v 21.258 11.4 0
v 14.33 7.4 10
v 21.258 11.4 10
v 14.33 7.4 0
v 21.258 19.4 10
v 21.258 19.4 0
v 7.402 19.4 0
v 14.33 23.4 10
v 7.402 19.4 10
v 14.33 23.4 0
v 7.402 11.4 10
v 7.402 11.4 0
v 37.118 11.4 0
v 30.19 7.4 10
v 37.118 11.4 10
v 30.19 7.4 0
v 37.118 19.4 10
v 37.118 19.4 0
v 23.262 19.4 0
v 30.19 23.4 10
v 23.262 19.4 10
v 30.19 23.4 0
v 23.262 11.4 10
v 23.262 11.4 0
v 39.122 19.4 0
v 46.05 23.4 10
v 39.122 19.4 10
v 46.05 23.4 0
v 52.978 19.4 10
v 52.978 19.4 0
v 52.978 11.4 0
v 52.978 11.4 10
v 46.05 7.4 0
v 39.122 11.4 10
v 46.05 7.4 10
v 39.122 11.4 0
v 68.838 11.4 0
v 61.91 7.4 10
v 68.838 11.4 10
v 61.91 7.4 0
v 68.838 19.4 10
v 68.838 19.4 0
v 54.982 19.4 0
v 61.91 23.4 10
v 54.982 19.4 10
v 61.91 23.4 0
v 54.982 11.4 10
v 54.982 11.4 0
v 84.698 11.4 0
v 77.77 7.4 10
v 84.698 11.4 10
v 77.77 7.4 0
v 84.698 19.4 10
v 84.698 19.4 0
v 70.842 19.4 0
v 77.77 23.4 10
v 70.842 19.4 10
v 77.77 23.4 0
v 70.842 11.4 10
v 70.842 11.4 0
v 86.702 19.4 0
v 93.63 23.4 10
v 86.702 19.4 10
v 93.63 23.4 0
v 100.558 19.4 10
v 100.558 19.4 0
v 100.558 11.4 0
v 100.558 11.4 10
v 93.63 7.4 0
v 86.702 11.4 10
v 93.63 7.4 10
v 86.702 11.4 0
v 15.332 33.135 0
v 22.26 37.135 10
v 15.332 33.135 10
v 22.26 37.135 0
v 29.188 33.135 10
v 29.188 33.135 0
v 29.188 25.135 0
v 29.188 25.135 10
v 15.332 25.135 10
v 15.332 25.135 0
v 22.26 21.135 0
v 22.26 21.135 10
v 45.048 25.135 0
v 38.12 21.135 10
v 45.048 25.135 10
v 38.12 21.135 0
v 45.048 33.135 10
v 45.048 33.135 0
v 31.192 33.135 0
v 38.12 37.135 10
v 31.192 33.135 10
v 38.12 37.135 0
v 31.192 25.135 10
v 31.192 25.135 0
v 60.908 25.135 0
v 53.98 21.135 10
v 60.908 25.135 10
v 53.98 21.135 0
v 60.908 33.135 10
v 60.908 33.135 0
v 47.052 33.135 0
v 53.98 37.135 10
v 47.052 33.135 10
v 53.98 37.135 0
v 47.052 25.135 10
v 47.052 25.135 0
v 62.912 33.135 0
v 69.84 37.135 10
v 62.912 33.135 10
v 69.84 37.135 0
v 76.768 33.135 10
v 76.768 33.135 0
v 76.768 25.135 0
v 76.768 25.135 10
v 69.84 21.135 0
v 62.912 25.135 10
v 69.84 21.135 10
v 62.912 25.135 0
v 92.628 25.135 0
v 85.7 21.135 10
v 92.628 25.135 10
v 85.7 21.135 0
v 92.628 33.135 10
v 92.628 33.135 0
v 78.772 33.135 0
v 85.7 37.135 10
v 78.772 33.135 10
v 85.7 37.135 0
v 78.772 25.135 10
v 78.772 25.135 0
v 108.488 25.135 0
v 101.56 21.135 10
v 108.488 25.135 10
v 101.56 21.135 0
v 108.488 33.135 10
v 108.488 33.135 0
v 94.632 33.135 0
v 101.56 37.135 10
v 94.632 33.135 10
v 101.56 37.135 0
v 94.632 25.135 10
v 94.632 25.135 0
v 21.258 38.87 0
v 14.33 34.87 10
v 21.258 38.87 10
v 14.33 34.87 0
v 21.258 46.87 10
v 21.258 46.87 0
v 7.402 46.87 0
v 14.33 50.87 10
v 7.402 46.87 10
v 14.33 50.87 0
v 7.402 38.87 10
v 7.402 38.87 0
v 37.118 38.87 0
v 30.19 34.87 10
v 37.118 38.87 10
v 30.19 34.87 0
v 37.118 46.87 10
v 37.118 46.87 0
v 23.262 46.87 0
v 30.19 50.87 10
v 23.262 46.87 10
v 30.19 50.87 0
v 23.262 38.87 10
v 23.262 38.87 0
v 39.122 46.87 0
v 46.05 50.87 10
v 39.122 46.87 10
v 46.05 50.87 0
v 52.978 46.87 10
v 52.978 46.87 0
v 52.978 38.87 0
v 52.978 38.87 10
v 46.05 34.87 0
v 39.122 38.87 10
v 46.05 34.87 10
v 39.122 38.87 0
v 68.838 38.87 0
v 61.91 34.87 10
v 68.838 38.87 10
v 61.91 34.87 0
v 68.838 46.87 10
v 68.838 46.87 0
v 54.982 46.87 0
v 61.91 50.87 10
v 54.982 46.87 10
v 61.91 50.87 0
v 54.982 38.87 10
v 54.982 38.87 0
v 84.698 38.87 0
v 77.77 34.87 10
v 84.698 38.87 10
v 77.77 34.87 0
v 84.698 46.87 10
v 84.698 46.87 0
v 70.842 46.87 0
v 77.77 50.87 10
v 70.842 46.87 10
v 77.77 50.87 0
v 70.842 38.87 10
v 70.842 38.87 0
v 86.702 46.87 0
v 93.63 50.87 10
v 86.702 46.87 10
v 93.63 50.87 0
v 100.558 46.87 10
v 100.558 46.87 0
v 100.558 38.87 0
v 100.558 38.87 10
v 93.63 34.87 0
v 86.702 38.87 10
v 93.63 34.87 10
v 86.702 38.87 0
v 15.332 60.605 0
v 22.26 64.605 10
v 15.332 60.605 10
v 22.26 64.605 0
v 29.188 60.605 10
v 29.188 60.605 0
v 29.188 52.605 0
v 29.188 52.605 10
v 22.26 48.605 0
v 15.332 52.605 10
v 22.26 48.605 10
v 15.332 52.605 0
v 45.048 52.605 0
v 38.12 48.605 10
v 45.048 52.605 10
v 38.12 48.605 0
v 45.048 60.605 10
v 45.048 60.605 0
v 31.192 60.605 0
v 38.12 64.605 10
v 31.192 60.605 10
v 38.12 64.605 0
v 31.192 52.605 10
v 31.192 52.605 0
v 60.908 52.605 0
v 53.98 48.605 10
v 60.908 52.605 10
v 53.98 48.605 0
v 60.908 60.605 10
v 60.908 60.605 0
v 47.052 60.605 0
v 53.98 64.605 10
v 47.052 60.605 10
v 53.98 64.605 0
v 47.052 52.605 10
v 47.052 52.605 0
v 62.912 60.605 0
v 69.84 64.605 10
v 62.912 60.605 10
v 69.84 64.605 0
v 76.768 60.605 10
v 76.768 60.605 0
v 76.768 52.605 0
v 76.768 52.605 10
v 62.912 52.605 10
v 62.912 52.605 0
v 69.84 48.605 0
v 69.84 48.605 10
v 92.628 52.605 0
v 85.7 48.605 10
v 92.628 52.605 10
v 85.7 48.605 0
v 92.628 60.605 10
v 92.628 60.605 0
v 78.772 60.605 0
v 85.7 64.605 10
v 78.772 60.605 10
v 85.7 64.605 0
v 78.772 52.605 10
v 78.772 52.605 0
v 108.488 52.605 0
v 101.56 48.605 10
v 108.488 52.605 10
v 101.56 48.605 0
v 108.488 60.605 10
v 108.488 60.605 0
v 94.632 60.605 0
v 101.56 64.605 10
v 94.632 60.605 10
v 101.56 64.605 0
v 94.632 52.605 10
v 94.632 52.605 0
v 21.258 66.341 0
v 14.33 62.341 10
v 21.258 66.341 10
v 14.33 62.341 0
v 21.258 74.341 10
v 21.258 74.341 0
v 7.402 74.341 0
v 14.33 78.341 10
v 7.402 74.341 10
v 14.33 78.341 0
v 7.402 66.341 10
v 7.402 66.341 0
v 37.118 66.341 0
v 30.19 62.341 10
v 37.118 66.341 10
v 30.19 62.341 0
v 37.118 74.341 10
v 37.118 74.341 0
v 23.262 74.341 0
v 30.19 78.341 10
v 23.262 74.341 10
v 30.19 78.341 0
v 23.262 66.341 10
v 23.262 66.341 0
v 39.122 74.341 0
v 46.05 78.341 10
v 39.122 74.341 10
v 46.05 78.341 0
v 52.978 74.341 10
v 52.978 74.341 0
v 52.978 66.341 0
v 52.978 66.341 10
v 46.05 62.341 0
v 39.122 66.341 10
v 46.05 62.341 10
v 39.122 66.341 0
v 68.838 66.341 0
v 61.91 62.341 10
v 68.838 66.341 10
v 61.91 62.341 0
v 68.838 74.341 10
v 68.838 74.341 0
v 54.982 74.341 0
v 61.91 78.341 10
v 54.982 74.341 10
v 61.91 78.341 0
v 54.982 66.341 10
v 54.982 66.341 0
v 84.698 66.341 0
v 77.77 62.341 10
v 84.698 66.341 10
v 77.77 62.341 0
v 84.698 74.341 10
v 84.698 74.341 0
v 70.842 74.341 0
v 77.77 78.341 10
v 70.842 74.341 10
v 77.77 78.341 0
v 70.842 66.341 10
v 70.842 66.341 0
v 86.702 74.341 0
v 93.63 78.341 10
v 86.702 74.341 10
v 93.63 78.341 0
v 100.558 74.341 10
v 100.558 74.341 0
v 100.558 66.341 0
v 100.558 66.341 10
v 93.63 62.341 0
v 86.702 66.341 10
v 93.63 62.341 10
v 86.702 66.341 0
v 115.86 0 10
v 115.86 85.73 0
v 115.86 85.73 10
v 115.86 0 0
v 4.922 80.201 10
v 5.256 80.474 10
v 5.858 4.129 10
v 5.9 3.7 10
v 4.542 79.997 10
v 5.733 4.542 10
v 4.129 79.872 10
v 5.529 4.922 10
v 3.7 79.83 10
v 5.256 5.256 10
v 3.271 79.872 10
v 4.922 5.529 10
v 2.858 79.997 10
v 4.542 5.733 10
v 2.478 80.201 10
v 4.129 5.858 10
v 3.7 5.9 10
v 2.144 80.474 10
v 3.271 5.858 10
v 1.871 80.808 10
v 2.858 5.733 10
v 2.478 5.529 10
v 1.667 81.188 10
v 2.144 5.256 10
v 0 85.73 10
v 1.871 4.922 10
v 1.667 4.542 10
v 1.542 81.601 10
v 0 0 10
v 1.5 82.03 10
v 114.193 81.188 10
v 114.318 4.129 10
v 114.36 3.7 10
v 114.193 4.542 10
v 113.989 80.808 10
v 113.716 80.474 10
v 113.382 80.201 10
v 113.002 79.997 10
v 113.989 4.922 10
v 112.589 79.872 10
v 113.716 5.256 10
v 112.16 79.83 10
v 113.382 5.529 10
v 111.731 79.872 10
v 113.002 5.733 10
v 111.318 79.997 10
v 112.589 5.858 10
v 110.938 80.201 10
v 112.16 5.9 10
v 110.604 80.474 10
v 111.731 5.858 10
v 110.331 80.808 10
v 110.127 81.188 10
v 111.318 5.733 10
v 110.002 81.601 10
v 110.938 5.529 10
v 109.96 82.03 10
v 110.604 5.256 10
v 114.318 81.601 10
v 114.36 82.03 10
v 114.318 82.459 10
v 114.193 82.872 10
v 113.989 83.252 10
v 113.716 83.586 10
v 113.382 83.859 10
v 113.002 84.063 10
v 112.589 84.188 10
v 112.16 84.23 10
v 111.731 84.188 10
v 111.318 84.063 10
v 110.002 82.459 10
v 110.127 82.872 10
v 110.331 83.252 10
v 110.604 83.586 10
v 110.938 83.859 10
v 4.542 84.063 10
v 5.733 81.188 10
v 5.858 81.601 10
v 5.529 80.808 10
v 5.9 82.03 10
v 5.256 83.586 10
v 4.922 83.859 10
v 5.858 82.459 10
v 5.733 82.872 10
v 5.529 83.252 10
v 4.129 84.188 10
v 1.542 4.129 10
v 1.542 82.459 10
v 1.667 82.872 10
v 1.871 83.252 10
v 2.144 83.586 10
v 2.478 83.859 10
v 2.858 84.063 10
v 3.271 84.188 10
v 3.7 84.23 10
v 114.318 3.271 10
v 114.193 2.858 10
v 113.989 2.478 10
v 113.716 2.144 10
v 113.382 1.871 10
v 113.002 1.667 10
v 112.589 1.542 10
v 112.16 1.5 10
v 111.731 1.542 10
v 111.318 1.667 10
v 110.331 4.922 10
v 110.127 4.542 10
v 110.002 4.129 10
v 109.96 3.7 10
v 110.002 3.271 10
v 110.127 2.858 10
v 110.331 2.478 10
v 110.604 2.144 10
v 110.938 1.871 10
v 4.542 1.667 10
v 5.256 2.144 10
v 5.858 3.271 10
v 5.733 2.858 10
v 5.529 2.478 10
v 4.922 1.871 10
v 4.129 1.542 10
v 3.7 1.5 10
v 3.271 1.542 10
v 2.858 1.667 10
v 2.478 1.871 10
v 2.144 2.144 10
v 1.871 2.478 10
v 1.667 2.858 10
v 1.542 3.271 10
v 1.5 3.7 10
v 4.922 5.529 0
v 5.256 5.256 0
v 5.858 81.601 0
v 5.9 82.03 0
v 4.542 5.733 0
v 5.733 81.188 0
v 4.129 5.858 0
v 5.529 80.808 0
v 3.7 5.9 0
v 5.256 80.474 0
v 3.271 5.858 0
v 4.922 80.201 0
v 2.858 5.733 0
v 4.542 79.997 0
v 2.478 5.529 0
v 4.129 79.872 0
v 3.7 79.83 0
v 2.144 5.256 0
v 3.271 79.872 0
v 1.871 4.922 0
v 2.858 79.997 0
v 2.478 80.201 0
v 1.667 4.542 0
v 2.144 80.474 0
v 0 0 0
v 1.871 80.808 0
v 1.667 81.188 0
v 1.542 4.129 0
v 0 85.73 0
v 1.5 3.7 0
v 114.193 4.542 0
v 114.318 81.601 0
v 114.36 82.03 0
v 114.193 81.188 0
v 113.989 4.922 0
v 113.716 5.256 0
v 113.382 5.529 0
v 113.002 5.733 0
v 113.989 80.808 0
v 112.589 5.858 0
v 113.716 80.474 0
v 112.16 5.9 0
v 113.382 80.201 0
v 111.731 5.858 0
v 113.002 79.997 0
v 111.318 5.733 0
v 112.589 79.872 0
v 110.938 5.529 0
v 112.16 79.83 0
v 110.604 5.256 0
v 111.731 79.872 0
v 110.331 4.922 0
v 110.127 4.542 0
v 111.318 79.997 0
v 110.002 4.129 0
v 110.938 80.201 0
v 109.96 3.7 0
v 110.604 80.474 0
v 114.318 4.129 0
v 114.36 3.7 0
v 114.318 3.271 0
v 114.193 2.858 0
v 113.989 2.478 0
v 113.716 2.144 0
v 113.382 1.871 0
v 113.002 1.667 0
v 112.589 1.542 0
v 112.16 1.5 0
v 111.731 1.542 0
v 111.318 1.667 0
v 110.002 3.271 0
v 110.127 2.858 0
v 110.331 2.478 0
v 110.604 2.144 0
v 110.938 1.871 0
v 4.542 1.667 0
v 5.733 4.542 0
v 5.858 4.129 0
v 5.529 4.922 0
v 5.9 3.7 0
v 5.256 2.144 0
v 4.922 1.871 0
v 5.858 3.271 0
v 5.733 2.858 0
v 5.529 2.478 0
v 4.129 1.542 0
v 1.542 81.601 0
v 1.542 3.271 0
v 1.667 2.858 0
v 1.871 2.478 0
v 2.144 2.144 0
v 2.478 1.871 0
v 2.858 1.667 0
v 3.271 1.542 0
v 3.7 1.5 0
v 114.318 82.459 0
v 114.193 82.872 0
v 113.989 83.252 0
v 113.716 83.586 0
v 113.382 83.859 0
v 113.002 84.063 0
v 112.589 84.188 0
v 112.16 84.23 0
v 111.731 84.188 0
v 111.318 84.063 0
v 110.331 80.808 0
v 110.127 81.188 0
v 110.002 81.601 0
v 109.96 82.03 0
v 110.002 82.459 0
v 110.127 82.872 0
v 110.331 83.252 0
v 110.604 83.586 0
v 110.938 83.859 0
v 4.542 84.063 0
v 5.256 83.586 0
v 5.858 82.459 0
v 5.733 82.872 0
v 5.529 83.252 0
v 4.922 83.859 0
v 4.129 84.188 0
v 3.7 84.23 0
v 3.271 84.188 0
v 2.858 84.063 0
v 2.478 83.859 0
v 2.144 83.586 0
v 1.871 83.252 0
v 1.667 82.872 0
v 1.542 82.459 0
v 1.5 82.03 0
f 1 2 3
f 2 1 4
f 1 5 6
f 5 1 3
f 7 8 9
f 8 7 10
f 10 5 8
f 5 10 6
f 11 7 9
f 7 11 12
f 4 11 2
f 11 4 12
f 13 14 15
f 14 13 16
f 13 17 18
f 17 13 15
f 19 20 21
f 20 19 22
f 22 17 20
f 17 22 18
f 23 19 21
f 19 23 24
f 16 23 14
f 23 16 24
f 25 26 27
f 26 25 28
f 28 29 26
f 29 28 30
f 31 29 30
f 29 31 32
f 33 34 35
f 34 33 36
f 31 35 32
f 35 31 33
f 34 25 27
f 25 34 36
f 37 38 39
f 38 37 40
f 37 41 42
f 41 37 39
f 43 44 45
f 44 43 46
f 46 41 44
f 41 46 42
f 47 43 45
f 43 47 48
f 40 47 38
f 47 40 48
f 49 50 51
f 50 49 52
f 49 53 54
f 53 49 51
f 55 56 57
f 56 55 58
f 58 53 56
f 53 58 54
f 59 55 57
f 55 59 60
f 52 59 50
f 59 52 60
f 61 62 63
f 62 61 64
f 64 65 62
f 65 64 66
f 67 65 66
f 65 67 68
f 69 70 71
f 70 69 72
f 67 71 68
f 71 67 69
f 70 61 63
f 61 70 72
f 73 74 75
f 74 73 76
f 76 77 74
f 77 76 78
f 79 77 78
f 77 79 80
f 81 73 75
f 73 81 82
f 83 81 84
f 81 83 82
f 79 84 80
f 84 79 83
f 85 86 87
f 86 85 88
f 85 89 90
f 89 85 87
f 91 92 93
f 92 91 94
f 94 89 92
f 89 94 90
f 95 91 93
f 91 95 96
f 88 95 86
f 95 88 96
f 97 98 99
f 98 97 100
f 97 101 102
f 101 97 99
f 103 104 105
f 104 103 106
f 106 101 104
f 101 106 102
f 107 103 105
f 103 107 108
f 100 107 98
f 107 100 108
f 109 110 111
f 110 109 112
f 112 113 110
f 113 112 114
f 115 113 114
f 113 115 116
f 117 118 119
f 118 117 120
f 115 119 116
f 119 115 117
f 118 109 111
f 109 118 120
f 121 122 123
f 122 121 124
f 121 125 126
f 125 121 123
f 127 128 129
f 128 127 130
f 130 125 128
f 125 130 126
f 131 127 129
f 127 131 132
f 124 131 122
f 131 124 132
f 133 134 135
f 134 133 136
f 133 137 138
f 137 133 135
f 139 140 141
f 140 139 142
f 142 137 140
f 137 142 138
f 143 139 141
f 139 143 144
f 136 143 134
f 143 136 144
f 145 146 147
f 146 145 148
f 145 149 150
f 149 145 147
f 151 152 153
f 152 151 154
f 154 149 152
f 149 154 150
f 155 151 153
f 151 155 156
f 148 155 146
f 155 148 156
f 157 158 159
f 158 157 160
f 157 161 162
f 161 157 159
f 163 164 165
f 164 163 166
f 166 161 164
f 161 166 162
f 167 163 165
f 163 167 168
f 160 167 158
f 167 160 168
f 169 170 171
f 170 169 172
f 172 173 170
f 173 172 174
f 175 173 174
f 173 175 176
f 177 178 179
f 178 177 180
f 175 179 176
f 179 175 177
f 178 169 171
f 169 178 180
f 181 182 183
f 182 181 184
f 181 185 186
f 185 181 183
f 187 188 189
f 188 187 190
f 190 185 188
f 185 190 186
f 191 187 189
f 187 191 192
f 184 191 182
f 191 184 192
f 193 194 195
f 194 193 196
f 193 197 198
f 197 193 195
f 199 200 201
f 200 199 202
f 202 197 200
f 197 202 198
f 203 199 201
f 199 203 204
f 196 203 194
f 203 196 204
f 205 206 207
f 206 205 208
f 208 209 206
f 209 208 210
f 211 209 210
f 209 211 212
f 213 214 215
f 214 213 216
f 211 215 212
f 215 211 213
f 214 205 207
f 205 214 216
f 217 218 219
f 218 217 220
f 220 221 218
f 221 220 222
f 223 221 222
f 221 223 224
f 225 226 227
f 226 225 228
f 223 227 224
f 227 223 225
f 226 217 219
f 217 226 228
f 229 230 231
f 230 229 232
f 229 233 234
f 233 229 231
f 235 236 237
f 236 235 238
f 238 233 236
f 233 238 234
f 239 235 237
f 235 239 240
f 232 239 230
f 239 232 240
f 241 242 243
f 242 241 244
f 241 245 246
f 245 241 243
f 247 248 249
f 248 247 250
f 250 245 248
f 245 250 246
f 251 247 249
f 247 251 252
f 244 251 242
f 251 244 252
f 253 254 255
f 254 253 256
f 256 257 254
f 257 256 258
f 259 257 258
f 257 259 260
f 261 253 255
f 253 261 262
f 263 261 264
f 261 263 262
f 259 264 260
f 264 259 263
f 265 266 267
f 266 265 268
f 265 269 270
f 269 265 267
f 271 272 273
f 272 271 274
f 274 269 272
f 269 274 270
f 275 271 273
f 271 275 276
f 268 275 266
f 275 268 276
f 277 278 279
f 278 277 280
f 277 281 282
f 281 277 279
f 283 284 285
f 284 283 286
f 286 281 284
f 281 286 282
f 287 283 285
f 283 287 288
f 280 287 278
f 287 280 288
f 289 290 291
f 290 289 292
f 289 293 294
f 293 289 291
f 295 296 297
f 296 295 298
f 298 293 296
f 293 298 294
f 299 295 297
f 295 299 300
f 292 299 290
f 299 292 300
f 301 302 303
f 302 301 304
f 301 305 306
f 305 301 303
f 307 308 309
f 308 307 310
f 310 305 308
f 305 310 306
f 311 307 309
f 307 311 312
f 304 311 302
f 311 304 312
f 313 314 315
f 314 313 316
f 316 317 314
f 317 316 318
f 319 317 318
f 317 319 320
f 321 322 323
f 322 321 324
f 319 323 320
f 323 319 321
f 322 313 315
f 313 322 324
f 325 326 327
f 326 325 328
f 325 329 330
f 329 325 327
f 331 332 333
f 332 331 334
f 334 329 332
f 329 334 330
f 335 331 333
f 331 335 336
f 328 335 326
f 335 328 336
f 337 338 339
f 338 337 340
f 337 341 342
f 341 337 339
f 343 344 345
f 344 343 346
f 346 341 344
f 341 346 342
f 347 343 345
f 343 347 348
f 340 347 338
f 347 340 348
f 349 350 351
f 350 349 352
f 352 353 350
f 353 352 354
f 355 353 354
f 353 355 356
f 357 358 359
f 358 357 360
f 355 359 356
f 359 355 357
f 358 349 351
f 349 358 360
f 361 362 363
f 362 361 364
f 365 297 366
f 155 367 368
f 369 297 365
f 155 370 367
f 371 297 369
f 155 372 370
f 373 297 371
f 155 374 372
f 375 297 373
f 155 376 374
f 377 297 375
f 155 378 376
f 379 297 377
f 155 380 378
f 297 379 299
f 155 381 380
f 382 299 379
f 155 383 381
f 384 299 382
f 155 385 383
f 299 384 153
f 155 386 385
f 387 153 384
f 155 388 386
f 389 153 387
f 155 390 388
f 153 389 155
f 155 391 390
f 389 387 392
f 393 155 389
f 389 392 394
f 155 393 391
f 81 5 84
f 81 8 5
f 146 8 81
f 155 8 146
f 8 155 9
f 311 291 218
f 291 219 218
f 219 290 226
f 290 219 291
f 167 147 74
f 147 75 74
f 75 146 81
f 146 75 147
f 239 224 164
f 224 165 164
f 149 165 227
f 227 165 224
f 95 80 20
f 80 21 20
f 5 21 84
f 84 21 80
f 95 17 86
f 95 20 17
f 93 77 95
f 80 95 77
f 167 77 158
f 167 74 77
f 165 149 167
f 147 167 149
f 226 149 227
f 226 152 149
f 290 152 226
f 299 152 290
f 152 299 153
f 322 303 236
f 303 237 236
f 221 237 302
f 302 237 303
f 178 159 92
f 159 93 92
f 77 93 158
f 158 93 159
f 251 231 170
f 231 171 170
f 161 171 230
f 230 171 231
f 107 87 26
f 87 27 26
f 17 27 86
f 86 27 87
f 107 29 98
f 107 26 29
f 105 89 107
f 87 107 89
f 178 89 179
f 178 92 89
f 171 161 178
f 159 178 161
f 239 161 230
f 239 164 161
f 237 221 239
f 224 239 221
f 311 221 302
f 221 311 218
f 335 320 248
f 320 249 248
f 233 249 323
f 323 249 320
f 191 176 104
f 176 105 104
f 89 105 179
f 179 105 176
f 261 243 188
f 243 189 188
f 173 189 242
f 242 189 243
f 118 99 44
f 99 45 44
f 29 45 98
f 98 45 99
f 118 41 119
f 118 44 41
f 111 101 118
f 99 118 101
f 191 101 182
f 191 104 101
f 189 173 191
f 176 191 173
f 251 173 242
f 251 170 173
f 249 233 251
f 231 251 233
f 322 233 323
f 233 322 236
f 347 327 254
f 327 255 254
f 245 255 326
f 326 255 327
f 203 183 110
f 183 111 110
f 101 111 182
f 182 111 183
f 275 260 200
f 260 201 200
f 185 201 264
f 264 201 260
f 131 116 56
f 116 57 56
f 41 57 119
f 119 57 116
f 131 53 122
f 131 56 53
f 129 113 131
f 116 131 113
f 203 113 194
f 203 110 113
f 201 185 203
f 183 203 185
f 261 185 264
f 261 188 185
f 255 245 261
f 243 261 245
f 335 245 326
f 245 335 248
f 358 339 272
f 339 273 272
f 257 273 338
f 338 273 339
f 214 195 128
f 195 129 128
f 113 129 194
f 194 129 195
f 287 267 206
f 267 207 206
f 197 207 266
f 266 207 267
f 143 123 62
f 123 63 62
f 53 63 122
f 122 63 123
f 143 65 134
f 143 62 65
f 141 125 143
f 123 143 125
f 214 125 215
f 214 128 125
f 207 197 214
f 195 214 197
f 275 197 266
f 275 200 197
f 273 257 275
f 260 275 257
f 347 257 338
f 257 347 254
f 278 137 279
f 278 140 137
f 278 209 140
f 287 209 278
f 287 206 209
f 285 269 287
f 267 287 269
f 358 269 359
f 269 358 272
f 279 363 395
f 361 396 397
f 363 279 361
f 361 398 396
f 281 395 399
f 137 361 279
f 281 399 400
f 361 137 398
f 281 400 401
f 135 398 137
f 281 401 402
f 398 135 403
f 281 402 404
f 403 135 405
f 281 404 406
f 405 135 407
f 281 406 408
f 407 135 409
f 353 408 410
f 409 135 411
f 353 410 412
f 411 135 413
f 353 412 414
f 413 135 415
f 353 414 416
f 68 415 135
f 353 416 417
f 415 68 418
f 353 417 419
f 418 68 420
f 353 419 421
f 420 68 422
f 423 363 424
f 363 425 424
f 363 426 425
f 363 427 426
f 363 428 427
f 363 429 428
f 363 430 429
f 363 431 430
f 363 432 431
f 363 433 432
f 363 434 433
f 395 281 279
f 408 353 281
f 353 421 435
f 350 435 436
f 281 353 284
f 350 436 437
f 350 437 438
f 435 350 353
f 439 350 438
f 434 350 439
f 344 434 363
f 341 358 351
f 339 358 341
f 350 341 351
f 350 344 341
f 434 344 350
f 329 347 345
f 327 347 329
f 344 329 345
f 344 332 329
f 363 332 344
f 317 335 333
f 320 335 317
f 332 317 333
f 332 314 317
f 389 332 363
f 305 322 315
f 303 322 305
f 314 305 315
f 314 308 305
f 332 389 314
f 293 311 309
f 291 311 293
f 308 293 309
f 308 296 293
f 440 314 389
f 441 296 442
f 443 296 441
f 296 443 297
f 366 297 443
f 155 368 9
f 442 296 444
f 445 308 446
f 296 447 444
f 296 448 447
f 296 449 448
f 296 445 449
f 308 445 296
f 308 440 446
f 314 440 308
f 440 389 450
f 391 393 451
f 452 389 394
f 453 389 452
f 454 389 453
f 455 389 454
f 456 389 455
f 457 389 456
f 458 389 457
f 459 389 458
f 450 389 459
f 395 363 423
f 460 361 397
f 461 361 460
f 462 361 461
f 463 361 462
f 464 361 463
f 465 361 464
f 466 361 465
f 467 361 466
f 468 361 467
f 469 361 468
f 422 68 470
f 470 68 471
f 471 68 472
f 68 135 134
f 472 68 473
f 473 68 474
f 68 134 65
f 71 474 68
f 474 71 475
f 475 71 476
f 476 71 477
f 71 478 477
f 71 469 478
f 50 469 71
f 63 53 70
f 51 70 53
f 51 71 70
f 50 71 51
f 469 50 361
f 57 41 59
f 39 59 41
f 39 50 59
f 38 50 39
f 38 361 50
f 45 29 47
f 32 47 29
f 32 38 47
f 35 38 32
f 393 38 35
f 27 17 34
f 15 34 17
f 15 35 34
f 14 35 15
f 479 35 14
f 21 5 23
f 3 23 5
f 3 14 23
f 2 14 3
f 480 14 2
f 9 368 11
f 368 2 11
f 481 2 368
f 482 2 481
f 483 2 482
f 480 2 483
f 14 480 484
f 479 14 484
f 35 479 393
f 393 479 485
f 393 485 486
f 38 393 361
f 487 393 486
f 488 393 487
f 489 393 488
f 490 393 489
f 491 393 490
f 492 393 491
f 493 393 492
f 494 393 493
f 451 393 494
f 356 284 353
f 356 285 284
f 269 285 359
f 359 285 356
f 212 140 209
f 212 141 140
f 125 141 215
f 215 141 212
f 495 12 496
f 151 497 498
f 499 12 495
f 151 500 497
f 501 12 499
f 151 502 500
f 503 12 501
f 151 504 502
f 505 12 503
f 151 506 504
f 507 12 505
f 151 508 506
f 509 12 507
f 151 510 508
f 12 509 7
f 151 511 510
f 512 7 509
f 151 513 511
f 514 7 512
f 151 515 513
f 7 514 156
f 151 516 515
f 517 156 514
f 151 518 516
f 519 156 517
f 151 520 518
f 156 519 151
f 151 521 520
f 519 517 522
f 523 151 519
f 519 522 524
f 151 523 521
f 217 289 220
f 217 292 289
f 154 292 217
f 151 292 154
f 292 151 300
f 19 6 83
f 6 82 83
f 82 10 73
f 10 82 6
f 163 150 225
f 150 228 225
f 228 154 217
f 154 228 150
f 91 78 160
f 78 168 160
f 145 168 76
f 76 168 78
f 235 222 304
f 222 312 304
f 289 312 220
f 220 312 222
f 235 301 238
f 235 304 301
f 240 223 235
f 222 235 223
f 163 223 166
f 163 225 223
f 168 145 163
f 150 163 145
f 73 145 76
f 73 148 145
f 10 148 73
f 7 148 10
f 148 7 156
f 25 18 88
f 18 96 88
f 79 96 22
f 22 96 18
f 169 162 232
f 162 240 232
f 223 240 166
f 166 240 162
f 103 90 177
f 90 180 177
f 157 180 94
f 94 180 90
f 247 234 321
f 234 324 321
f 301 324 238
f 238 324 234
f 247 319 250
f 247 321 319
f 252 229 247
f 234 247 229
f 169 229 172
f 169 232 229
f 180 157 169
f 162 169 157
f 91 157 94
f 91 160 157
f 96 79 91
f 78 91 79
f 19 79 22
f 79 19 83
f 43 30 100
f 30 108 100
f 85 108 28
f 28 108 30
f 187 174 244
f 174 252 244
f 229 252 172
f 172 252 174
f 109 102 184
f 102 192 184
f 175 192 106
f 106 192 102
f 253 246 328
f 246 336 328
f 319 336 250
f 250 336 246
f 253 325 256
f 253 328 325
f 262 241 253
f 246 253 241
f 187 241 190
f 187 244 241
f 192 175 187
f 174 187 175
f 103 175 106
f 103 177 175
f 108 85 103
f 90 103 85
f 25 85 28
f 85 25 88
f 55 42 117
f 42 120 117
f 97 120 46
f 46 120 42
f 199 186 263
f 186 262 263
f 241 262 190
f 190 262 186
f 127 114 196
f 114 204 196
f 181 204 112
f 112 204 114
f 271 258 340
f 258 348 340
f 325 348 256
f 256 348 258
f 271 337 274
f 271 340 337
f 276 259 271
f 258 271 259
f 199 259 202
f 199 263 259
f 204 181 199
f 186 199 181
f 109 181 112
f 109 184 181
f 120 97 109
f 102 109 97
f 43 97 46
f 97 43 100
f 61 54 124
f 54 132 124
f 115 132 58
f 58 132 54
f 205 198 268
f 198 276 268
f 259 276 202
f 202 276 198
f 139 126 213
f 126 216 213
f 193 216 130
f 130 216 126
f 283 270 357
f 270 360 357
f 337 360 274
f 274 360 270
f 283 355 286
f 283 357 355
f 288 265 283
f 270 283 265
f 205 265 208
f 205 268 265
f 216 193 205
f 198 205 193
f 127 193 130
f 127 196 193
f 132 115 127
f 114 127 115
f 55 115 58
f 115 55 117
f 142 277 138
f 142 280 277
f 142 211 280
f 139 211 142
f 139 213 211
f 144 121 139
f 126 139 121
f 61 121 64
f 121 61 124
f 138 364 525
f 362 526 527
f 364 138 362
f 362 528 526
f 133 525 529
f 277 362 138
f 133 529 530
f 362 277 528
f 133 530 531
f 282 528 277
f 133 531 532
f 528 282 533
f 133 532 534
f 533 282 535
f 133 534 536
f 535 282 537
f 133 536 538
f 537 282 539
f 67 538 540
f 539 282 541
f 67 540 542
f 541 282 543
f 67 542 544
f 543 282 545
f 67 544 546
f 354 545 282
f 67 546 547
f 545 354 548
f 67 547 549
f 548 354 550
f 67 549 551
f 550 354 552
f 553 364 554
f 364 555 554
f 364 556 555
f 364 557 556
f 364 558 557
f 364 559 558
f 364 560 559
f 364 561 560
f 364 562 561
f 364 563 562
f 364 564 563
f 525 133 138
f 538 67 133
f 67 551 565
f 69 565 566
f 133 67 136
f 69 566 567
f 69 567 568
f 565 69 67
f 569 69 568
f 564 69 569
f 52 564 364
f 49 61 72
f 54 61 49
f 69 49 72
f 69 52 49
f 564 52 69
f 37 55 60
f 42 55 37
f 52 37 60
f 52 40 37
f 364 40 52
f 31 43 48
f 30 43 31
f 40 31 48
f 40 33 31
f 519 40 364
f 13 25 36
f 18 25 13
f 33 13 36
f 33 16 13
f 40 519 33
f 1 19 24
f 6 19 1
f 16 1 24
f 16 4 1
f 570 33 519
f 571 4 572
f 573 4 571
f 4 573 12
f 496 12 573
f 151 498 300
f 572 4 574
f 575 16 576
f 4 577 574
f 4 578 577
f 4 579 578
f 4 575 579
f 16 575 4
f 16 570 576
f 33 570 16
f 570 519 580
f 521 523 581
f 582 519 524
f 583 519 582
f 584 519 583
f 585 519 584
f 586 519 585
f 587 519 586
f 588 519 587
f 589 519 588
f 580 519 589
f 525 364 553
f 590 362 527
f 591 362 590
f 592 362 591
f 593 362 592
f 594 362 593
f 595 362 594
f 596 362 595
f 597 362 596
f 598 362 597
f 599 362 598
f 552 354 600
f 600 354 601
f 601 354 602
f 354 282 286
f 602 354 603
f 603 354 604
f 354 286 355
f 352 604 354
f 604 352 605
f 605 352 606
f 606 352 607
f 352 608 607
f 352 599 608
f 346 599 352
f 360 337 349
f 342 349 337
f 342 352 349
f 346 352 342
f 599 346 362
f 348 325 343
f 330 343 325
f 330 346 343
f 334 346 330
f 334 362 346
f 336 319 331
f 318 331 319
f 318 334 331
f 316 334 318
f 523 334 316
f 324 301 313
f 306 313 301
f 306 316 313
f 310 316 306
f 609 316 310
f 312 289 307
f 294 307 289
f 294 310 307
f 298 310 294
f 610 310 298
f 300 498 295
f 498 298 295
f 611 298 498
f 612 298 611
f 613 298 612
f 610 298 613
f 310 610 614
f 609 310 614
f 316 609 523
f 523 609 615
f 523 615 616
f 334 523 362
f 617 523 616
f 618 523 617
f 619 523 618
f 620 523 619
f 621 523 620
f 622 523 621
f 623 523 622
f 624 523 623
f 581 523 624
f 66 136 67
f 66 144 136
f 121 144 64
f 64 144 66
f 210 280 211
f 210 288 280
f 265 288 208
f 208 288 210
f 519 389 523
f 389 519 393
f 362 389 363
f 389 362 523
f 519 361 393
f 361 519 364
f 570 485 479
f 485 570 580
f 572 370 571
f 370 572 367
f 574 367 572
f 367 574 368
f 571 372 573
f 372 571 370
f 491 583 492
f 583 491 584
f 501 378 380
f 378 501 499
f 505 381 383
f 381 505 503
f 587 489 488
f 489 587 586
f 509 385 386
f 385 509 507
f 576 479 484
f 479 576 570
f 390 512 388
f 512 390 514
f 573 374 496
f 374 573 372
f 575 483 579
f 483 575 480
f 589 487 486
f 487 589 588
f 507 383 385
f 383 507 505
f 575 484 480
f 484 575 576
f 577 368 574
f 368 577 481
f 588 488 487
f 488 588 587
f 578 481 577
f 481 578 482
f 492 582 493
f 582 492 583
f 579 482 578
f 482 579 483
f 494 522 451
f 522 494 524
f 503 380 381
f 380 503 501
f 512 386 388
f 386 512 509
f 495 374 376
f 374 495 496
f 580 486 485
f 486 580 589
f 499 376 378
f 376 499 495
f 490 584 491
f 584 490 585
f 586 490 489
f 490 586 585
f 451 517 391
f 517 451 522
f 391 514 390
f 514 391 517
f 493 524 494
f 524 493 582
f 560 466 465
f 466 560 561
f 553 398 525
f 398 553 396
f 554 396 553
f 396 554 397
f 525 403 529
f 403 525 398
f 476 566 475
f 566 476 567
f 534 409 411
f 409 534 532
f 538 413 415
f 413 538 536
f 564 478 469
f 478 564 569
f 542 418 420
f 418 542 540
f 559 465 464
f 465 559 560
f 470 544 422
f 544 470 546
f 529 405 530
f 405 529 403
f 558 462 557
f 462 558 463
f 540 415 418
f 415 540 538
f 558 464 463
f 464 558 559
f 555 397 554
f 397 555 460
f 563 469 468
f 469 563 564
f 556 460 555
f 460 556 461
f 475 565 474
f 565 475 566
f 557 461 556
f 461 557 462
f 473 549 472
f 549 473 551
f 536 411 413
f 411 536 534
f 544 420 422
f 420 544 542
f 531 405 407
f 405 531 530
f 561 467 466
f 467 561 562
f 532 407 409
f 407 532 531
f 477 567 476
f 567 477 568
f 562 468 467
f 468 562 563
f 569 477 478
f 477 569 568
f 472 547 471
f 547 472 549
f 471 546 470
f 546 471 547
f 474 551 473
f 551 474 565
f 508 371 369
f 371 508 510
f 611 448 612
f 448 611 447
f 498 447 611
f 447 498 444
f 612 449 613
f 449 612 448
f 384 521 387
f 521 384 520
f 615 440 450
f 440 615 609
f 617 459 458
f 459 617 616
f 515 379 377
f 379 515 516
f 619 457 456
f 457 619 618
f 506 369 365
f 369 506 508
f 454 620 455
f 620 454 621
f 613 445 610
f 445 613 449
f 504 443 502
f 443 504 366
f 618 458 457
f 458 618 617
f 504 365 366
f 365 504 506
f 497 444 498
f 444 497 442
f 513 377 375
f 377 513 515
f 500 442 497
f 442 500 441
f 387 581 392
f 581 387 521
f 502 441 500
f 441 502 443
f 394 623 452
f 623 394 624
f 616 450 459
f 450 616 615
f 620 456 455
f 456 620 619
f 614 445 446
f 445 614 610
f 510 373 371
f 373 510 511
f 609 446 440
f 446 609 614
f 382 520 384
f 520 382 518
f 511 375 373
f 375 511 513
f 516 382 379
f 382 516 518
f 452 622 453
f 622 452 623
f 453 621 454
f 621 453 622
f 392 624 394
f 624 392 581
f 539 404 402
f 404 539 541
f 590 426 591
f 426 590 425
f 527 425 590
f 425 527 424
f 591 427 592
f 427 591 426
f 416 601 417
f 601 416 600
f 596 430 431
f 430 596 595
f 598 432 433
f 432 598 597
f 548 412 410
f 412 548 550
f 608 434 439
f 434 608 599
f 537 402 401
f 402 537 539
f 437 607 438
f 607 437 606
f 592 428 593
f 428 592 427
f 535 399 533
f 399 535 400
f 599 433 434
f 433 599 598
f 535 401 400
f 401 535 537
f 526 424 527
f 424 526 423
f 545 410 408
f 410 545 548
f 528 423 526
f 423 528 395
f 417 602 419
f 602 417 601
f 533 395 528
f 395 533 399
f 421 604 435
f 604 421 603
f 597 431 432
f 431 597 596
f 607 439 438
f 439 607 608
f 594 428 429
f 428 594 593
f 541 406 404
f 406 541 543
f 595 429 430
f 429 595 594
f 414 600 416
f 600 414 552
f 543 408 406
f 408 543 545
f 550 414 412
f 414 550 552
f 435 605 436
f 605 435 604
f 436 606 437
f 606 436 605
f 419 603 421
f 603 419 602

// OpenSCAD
$fn = 32;

// ----------------------------------------------------------------------
// Honeycomb panel: 115.86 x 85.73 mm, 30 cells of 16 mm
// ----------------------------------------------------------------------

// --- parameters (mm) ---
panel_w = 115.86;         // panel width
panel_d = 85.73;          // panel depth
thick = 10;               // panel thickness
cell_r = 8;               // hex cell circumradius
pitch = 15.86;            // hex cell pitch (centre to centre)
web = 2;                  // web between the cells
columns = 6;              // columns of cells
rows = 5;                 // rows of cells
cell_count = 30;          // total cells
shift_x = 14.33;          // first cell offset in x
shift_y = 15.4;           // first cell offset in y
mount_d = 4.4;            // corner mounting holes
hole_off = 3.7;           // mounting hole offset from the corners

difference() {
  union() {
    cube([panel_w, panel_d, thick]);
  }
  /* hexagonal cells, point-up, cut right through the plate */
  for (row = [0 : rows - 1]) {
    for (col = [0 : columns - 1]) {
      translate([shift_x + col * pitch + (row % 2) * pitch / 2, shift_y + row * pitch * 0.866025, -2.5]) rotate([0, 0, 30]) cylinder(h = thick + 5, d = 2 * cell_r, $fn = 6);
    }
  }
  /* corner mounting holes, clear of the outer cell web */
  translate([3.7, 3.7, -2.5]) cylinder(h = thick + 5, d = mount_d);
  translate([112.16, 3.7, -2.5]) cylinder(h = thick + 5, d = mount_d);
  translate([3.7, 82.03, -2.5]) cylinder(h = thick + 5, d = mount_d);
  translate([112.16, 82.03, -2.5]) cylinder(h = thick + 5, d = mount_d);
}
